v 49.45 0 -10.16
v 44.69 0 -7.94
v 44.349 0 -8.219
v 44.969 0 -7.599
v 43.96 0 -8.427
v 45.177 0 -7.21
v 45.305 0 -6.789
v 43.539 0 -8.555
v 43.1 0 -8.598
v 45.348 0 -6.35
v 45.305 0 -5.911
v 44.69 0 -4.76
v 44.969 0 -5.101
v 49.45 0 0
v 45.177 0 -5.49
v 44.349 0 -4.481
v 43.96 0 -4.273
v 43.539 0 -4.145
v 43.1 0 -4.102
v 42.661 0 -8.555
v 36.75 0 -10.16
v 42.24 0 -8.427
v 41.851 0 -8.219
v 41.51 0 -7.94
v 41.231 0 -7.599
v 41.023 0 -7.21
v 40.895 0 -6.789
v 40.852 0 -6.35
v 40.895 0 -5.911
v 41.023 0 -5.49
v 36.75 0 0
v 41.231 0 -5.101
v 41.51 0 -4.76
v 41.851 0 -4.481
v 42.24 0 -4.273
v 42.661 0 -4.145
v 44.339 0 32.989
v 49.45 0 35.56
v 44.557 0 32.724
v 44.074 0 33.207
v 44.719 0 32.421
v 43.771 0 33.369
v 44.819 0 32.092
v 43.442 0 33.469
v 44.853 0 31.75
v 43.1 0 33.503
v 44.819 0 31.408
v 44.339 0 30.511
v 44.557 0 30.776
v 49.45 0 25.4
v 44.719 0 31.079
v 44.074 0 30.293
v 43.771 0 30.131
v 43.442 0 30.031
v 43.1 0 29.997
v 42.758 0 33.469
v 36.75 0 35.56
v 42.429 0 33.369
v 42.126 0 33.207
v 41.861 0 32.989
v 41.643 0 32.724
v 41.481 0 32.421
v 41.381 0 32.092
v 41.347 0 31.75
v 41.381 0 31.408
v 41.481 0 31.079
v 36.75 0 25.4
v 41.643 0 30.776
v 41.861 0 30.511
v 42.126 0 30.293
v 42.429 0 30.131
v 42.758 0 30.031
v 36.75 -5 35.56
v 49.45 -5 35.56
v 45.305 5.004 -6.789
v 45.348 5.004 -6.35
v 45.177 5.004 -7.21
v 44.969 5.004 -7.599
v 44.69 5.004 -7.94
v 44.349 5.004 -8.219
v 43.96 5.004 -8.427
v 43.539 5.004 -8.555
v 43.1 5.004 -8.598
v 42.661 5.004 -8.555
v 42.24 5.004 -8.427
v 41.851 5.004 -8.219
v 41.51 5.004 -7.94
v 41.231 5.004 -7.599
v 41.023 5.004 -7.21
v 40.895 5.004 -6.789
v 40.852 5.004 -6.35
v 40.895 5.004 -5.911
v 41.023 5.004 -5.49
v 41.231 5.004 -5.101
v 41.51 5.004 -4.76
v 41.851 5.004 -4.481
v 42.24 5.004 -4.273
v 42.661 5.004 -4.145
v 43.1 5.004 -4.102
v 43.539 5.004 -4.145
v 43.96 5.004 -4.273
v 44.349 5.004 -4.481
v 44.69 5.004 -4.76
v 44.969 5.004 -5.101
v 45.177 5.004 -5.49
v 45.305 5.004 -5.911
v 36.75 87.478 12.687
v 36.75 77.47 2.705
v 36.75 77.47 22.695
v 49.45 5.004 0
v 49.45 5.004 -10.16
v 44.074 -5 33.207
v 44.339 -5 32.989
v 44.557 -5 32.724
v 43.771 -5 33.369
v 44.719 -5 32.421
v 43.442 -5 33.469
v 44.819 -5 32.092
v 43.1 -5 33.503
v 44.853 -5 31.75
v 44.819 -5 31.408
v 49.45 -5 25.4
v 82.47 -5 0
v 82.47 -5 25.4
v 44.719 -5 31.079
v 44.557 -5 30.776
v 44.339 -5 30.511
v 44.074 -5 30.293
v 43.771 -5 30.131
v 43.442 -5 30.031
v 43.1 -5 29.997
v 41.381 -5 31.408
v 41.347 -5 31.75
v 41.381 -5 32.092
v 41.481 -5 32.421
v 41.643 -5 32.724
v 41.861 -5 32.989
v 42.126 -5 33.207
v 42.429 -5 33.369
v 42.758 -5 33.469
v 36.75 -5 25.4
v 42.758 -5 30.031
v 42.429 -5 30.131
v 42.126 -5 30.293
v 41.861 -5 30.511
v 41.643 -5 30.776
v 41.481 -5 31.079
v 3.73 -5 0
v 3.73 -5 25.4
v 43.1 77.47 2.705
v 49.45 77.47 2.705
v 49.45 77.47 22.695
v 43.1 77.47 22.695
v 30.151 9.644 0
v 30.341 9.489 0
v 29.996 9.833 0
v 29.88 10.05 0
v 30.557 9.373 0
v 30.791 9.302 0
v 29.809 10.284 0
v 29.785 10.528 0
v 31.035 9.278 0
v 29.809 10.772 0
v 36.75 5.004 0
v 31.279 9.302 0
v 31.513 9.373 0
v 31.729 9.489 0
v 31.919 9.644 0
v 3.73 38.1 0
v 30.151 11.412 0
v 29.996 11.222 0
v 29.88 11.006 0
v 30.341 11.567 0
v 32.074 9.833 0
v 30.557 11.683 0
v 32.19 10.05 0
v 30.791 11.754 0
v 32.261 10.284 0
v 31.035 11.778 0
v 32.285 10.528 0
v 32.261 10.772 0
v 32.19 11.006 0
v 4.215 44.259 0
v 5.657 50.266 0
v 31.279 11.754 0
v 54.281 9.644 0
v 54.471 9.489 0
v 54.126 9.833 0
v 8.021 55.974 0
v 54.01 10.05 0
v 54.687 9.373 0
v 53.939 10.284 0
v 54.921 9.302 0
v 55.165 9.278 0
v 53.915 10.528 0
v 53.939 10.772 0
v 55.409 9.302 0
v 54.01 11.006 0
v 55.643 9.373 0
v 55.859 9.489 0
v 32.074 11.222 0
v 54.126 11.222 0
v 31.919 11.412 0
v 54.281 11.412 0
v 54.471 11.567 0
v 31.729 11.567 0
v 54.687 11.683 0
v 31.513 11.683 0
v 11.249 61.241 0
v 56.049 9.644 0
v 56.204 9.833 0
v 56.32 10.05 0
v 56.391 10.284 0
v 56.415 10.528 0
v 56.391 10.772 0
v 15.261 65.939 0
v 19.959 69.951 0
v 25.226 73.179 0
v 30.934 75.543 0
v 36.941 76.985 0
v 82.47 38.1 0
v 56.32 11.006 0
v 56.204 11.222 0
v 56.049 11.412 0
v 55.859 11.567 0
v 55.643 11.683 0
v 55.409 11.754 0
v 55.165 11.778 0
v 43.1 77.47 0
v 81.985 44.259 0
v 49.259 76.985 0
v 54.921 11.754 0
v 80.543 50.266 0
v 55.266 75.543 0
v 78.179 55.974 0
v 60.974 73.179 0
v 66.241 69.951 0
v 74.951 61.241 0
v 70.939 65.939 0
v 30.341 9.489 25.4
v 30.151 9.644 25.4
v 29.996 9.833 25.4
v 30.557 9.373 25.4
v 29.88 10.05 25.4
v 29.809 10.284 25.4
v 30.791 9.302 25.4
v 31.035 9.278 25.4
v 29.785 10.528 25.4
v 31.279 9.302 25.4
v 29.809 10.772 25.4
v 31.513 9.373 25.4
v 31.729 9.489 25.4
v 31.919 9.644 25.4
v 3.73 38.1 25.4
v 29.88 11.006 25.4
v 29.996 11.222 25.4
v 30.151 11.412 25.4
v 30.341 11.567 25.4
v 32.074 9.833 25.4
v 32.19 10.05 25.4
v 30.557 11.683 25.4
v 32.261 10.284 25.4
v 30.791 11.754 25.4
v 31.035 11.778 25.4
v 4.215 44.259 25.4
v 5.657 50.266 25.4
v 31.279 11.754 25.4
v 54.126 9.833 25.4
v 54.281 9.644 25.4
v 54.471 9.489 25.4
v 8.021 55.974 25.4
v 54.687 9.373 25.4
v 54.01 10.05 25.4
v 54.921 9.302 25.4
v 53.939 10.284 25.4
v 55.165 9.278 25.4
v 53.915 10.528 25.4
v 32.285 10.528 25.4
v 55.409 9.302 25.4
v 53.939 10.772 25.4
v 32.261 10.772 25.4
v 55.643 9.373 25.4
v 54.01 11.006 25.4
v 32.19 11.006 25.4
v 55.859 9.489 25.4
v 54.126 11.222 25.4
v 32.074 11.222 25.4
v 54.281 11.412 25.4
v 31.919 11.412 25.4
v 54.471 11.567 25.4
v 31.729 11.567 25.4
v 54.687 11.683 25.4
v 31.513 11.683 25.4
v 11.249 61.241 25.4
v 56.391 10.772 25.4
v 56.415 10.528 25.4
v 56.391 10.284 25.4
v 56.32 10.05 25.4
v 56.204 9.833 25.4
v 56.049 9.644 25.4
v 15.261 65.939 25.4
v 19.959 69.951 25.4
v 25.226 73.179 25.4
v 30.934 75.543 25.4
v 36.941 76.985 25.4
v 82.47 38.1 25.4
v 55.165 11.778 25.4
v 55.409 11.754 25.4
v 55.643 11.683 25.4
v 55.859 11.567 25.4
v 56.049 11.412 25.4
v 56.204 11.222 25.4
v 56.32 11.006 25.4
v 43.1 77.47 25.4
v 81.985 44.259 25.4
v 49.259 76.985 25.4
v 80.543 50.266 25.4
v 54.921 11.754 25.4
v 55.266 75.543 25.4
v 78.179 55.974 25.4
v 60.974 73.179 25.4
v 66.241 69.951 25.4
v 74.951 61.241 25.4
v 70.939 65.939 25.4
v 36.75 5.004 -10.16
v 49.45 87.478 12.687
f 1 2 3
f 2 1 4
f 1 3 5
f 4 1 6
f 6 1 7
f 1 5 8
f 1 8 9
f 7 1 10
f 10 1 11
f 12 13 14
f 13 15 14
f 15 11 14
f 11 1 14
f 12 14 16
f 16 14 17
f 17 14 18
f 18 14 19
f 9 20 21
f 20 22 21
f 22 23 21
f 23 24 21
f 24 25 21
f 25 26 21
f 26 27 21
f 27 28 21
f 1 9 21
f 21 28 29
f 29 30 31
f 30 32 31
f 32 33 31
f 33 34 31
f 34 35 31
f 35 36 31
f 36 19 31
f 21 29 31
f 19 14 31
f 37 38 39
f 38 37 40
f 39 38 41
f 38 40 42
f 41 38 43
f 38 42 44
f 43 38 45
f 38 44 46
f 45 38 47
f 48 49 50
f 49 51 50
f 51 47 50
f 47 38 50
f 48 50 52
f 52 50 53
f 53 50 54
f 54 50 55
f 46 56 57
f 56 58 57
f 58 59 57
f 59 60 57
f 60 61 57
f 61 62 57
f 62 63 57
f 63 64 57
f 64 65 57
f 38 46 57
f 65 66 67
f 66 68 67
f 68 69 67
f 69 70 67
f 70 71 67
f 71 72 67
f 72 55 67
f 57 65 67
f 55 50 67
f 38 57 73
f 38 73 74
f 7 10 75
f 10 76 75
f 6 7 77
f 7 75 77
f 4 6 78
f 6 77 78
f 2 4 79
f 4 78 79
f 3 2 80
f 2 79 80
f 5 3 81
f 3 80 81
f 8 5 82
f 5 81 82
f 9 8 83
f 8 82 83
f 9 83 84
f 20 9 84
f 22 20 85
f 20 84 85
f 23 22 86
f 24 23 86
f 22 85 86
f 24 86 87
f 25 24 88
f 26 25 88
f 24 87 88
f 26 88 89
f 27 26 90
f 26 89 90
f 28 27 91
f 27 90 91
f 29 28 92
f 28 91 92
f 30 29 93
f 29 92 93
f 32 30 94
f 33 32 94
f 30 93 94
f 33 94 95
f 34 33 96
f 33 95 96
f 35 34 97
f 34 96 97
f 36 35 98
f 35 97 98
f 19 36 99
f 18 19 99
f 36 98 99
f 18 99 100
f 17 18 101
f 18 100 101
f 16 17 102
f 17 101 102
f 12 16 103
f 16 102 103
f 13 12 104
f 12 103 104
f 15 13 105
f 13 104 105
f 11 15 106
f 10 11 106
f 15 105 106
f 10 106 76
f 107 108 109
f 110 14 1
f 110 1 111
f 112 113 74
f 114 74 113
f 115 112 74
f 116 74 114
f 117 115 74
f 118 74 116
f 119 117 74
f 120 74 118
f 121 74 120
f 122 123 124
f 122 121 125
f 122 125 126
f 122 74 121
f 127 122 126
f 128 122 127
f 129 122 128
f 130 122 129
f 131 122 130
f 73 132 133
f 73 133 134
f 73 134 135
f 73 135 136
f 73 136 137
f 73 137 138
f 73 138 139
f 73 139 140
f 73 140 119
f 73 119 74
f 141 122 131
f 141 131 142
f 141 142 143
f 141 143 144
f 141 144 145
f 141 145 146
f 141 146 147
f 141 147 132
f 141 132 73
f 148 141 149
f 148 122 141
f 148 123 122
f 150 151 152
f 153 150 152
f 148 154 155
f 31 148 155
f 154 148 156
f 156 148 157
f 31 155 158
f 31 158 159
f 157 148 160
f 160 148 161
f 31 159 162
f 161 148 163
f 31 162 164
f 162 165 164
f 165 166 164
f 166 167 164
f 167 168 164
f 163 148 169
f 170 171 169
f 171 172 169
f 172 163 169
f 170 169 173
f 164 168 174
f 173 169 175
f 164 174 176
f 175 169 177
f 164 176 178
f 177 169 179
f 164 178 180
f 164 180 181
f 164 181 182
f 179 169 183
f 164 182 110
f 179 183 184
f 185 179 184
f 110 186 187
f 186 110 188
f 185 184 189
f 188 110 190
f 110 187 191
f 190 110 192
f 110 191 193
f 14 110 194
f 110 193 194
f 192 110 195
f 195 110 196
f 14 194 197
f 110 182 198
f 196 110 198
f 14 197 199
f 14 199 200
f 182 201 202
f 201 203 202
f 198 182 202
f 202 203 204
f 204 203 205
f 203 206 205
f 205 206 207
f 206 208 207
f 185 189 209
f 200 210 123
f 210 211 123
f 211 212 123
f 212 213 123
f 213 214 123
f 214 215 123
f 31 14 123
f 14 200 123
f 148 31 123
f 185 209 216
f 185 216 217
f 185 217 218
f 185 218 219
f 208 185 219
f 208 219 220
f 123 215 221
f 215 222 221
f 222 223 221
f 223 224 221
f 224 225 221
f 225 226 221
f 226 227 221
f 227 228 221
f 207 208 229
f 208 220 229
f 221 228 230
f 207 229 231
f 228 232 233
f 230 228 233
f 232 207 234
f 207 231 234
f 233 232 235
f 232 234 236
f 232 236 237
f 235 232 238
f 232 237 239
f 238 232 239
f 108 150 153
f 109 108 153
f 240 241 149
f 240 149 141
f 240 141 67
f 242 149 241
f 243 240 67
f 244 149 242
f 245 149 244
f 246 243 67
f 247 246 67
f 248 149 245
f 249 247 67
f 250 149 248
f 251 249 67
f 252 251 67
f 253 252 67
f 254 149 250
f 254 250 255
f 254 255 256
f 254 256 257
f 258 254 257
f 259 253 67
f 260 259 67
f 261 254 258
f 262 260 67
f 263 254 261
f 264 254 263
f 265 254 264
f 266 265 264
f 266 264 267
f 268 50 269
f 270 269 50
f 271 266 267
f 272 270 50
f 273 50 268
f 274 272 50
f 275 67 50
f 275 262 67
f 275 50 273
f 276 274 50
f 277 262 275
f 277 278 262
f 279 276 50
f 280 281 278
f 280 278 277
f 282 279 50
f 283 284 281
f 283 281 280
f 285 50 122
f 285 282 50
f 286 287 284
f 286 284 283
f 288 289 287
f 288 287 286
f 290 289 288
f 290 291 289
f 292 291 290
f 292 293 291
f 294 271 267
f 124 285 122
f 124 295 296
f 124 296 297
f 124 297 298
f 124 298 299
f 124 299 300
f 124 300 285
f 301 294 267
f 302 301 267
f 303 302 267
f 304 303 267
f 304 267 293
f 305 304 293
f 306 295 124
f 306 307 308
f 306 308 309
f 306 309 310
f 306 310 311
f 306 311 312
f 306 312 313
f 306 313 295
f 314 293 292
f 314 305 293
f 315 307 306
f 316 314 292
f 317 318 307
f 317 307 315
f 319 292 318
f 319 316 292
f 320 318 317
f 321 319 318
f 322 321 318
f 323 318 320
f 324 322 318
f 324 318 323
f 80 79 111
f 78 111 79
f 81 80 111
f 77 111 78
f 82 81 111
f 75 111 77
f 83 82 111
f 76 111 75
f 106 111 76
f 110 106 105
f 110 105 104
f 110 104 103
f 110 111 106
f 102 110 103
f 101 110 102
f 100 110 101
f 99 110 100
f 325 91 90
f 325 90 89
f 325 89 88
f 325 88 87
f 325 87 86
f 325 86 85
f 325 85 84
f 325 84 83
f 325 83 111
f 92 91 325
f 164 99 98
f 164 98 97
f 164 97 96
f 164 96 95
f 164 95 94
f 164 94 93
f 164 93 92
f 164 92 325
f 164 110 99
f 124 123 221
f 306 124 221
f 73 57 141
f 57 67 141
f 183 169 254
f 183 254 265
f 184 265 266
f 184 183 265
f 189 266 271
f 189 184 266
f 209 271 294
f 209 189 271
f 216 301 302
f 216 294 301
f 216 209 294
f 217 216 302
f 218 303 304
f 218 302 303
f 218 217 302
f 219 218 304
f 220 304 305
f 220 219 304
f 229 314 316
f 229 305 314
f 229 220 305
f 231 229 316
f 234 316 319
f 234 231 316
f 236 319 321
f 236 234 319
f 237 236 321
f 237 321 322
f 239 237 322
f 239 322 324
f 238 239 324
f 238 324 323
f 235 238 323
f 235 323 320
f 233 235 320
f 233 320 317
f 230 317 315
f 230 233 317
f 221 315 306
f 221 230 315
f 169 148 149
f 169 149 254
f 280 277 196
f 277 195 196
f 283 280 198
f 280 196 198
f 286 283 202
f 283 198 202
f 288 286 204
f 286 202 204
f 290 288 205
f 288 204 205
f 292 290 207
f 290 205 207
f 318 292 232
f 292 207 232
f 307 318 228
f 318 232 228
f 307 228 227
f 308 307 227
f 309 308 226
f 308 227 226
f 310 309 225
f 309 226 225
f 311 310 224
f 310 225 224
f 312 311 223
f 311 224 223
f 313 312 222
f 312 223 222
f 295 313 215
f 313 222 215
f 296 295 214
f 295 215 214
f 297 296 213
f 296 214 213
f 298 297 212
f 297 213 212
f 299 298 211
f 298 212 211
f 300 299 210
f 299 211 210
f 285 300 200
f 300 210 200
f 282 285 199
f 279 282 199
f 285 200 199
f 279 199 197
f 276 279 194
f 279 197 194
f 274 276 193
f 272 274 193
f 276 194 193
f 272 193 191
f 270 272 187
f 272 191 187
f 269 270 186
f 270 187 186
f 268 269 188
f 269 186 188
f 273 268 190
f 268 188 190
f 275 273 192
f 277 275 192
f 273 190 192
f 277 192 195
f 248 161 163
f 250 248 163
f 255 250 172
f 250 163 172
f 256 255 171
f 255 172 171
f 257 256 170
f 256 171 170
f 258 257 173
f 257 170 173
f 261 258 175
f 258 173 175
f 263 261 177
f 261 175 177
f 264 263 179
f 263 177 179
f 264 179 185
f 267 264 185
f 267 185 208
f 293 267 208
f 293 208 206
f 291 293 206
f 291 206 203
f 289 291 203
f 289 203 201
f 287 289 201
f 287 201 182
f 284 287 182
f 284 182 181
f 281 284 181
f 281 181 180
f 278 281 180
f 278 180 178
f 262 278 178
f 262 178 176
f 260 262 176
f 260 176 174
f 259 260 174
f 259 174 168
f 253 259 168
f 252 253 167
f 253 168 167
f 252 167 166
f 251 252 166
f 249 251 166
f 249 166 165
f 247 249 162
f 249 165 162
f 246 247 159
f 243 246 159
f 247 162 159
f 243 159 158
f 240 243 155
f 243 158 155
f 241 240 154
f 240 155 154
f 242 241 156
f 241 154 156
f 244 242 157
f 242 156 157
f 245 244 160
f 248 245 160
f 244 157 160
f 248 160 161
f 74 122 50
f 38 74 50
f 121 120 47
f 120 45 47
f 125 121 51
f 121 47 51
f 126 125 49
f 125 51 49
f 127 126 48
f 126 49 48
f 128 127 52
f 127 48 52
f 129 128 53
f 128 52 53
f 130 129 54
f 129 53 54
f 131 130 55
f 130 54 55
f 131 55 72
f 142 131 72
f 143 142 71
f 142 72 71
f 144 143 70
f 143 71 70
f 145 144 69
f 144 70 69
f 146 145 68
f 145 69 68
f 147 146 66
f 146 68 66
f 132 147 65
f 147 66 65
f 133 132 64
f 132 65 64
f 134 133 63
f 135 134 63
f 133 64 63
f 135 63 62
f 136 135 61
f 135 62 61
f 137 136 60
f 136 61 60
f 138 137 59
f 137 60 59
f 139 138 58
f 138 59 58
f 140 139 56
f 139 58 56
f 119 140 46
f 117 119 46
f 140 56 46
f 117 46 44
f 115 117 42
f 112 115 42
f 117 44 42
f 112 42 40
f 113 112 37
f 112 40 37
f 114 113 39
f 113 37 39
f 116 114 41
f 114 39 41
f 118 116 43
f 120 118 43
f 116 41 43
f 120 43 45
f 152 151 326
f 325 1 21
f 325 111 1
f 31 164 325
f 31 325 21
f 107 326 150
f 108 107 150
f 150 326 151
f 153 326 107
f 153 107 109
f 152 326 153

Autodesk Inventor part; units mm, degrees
ref_plane "YZ Plane" through (0, 0, 0) normal (1, 0, 0) x (0, 1, 0)
ref_plane "XZ Plane" through (0, 0, 0) normal (0, 1, 0) x (-1, 0, 0)
sketch "Sketch1" plane through (0, 0, 0) normal (0, 0, 1) x (1, 0, 0)
  line L0 (0, 38.1) -> (5, 38.1) projected
  line L1 (0, 0) -> (0, 38.1) projected
  line L2 (0, 0) -> (86.2, 0) projected
  line L3 (86.2, 0) -> (86.2, 38.1) projected
  line L4 (81.2, 38.1) -> (86.2, 38.1) projected
  arc A0 (81.2, 38.1) -> (5, 38.1) centre (43.1, 38.1) ccw projected
  arc A1 (86.2, 38.1) -> (0, 38.1) centre (43.1, 38.1) ccw projected
  line L5 (86.2, -5) -> (0, -5) projected
  circle A2 centre (43.1, 38.1) radius 39.37
  line L6 (3.73, 38.1) -> (83.74, 38.1)
  line L7 (83.74, -5) -> (3.73, -5)
  line L8 (3.73, -5) -> (3.73, 38.1)
  line L9 (81.2, 38.1) -> (3.73, 38.1)
  line L10 (3.73, 38.1) -> (3.73, -5)
  line L11 (3.73, -5) -> (81.2, -5)
  line L12 (82.47, 38.1) -> (3.73, 38.1)
  line L13 (3.73, 38.1) -> (3.73, -5)
  line L14 (3.73, -5) -> (82.47, -5)
  line L15 (82.47, -5) -> (82.47, 38.1)
  dimension "d3" = 78.74
extrude "Extrusion1" add sketch "Sketch1" along normal blind 25.4 contours A2 L4 A0 L0 | L0 L6 L4 A2 L2 | A2 L2 L8 | A0 L6 | L15 L2 A2 | A2 L2 L15 L5 L8 | L2 A2
sketch "Sketch2" plane through (0, 0, 0) normal (0, 0, -1) x (-1, 0, 0)
  line L0 (-34.95, -5) -> (-47.65, -5) projected
  line L1 (-47.65, -5) -> (-47.65, 0) projected
  line L2 (-47.65, 0) -> (-34.95, 0) projected
  line L3 (-34.95, 0) -> (-34.95, -5) projected
  line L4 (-3.73, 38.1) -> (-3.73, -5) projected
  line L5 (-3.73, -5) -> (-82.47, -5) projected
  line L6 (-82.47, -5) -> (-3.73, -5)
  line L7 (-43.1, -5) -> (-43.1, 0)
  line L8 (-43.1, 0) -> (-43.1, 5.0038)
  line L9 (-43.1, 5.0038) -> (-36.75, 5.0038)
  line L10 (-36.75, 5.0038) -> (-49.45, 5.0038)
  line L11 (-49.45, 5.0038) -> (-36.75, 5.0038)
  line L12 (-36.75, 5.0038) -> (-36.75, 0)
  line L13 (-36.75, 0) -> (-49.45, 0)
  line L14 (-49.45, 0) -> (-49.45, 5.0038)
  point P0 (0, 0)
  dimension "d44" = 5.0038
  dimension "d45" = 6.35
  dimension "d46" = 12.7
  dimension "d63" = 12.7
extrude "Extrusion2" add sketch "Sketch2" along normal blind 10.16 contours L8 L9 L12 L2 | L2 L13 L14 L10 L8
sketch "Sketch4" plane through (0, 0, 25.4) normal (0, 0, 1) x (1, 0, 0)
  line L0 (3.73, -5) -> (82.47, -5) projected
  line L1 (43.1, -5) -> (49.45, -5)
  line L2 (49.45, -5) -> (36.75, -5)
  line L3 (36.75, -5) -> (49.45, -5)
  line L4 (49.45, -5) -> (49.45, 0)
  line L5 (49.45, 0) -> (36.75, 0)
  line L6 (36.75, 0) -> (36.75, -5)
  point P0 (0, 0)
  dimension "d56" = 6.35
  dimension "d57" = 12.7
  dimension "d62" = 12.7
extrude "Extrusion4" add sketch "Sketch4" along normal blind 10.16
ref_plane "Work Plane1" through (43.1, -5, 0) normal (-1, 0, 0) x (0, 0, 1)
sketch "Sketch9" plane through (43.1, -5, 0) normal (-1, 0, 0) x (0, 0, 1)
  line L0 (0, 82.47) -> (0, 43.1) projected
  line L1 (0, 82.47) -> (2.7051, 82.47)
  line L2 (0, 82.47) -> (25.4, 82.47) projected
  line L3 (2.7051, 82.47) -> (22.6949, 82.47)
  line L4 (22.6949, 82.47) -> (12.6873, 82.47)
  line L5 (12.6873, 82.47) -> (12.6873, 92.4776)
  line L6 (12.6873, 92.4776) -> (22.6949, 82.47)
  line L7 (12.6873, 92.4776) -> (2.7051, 82.47)
  point P0 (0, 5)
  dimension "d30" = 2.7051
  dimension "d31" = 19.9898
  dimension "d32" = 10.0076
  dimension "d33" = 10.0076
extrude "Extrusion8" add sketch "Sketch9" along normal mid plane 12.7
sketch "Sketch11" plane through (36.75, 5.0038, 0) normal (0, 1, 0) x (1, 0, 0)
  line L0 (12.7, 10.16) -> (0, 10.16) projected
  line L1 (6.35, 10.16) -> (6.35, 6.35)
  circle A0 centre (6.35, 6.35) radius 2.2479
  point P0 (-36.75, 0)
  dimension "d47" = 3.81
  dimension "d48" = 4.4958
extrude "Extrusion10" cut sketch "Sketch11" against normal blind 25.4
sketch "Sketch12" plane through (0, 0, 0) normal (0, 0, -1) x (-1, 0, 0)
  line L0 (-31.035, 12.5599) -> (-55.165, 12.5599) projected
  line L1 (-55.165, 8.4959) -> (-31.035, 8.4959) projected
  line L2 (-55.165, 12.5599) -> (-55.165, 8.4959)
  line L3 (-31.035, 12.5599) -> (-31.035, 8.4959)
  circle A0 centre (-55.165, 10.5279) radius 1.25
  circle A1 centre (-31.035, 10.5279) radius 1.25
  point P0 (0, 0)
  dimension "d51" = 2.5
  dimension "d52" = 2.5
extrude "Extrusion11" cut sketch "Sketch12" against normal blind 25.4 contours A1 L3 | L3 A1 | A0 L2 | L2 A0
sketch "Sketch13" plane through (36.75, 0, 25.4) normal (0, 1, 0) x (1, 0, 0)
  line L0 (0, -10.16) -> (12.7, -10.16) projected
  line L1 (6.35, -10.16) -> (6.35, -6.35)
  circle A0 centre (6.35, -6.35) radius 1.7526
  point P0 (-36.75, 25.4)
  dimension "d58" = 3.81
  dimension "d59" = 3.5052
extrude "Extrusion12" cut sketch "Sketch13" against normal blind 25.4
properties part number "Tail1"
